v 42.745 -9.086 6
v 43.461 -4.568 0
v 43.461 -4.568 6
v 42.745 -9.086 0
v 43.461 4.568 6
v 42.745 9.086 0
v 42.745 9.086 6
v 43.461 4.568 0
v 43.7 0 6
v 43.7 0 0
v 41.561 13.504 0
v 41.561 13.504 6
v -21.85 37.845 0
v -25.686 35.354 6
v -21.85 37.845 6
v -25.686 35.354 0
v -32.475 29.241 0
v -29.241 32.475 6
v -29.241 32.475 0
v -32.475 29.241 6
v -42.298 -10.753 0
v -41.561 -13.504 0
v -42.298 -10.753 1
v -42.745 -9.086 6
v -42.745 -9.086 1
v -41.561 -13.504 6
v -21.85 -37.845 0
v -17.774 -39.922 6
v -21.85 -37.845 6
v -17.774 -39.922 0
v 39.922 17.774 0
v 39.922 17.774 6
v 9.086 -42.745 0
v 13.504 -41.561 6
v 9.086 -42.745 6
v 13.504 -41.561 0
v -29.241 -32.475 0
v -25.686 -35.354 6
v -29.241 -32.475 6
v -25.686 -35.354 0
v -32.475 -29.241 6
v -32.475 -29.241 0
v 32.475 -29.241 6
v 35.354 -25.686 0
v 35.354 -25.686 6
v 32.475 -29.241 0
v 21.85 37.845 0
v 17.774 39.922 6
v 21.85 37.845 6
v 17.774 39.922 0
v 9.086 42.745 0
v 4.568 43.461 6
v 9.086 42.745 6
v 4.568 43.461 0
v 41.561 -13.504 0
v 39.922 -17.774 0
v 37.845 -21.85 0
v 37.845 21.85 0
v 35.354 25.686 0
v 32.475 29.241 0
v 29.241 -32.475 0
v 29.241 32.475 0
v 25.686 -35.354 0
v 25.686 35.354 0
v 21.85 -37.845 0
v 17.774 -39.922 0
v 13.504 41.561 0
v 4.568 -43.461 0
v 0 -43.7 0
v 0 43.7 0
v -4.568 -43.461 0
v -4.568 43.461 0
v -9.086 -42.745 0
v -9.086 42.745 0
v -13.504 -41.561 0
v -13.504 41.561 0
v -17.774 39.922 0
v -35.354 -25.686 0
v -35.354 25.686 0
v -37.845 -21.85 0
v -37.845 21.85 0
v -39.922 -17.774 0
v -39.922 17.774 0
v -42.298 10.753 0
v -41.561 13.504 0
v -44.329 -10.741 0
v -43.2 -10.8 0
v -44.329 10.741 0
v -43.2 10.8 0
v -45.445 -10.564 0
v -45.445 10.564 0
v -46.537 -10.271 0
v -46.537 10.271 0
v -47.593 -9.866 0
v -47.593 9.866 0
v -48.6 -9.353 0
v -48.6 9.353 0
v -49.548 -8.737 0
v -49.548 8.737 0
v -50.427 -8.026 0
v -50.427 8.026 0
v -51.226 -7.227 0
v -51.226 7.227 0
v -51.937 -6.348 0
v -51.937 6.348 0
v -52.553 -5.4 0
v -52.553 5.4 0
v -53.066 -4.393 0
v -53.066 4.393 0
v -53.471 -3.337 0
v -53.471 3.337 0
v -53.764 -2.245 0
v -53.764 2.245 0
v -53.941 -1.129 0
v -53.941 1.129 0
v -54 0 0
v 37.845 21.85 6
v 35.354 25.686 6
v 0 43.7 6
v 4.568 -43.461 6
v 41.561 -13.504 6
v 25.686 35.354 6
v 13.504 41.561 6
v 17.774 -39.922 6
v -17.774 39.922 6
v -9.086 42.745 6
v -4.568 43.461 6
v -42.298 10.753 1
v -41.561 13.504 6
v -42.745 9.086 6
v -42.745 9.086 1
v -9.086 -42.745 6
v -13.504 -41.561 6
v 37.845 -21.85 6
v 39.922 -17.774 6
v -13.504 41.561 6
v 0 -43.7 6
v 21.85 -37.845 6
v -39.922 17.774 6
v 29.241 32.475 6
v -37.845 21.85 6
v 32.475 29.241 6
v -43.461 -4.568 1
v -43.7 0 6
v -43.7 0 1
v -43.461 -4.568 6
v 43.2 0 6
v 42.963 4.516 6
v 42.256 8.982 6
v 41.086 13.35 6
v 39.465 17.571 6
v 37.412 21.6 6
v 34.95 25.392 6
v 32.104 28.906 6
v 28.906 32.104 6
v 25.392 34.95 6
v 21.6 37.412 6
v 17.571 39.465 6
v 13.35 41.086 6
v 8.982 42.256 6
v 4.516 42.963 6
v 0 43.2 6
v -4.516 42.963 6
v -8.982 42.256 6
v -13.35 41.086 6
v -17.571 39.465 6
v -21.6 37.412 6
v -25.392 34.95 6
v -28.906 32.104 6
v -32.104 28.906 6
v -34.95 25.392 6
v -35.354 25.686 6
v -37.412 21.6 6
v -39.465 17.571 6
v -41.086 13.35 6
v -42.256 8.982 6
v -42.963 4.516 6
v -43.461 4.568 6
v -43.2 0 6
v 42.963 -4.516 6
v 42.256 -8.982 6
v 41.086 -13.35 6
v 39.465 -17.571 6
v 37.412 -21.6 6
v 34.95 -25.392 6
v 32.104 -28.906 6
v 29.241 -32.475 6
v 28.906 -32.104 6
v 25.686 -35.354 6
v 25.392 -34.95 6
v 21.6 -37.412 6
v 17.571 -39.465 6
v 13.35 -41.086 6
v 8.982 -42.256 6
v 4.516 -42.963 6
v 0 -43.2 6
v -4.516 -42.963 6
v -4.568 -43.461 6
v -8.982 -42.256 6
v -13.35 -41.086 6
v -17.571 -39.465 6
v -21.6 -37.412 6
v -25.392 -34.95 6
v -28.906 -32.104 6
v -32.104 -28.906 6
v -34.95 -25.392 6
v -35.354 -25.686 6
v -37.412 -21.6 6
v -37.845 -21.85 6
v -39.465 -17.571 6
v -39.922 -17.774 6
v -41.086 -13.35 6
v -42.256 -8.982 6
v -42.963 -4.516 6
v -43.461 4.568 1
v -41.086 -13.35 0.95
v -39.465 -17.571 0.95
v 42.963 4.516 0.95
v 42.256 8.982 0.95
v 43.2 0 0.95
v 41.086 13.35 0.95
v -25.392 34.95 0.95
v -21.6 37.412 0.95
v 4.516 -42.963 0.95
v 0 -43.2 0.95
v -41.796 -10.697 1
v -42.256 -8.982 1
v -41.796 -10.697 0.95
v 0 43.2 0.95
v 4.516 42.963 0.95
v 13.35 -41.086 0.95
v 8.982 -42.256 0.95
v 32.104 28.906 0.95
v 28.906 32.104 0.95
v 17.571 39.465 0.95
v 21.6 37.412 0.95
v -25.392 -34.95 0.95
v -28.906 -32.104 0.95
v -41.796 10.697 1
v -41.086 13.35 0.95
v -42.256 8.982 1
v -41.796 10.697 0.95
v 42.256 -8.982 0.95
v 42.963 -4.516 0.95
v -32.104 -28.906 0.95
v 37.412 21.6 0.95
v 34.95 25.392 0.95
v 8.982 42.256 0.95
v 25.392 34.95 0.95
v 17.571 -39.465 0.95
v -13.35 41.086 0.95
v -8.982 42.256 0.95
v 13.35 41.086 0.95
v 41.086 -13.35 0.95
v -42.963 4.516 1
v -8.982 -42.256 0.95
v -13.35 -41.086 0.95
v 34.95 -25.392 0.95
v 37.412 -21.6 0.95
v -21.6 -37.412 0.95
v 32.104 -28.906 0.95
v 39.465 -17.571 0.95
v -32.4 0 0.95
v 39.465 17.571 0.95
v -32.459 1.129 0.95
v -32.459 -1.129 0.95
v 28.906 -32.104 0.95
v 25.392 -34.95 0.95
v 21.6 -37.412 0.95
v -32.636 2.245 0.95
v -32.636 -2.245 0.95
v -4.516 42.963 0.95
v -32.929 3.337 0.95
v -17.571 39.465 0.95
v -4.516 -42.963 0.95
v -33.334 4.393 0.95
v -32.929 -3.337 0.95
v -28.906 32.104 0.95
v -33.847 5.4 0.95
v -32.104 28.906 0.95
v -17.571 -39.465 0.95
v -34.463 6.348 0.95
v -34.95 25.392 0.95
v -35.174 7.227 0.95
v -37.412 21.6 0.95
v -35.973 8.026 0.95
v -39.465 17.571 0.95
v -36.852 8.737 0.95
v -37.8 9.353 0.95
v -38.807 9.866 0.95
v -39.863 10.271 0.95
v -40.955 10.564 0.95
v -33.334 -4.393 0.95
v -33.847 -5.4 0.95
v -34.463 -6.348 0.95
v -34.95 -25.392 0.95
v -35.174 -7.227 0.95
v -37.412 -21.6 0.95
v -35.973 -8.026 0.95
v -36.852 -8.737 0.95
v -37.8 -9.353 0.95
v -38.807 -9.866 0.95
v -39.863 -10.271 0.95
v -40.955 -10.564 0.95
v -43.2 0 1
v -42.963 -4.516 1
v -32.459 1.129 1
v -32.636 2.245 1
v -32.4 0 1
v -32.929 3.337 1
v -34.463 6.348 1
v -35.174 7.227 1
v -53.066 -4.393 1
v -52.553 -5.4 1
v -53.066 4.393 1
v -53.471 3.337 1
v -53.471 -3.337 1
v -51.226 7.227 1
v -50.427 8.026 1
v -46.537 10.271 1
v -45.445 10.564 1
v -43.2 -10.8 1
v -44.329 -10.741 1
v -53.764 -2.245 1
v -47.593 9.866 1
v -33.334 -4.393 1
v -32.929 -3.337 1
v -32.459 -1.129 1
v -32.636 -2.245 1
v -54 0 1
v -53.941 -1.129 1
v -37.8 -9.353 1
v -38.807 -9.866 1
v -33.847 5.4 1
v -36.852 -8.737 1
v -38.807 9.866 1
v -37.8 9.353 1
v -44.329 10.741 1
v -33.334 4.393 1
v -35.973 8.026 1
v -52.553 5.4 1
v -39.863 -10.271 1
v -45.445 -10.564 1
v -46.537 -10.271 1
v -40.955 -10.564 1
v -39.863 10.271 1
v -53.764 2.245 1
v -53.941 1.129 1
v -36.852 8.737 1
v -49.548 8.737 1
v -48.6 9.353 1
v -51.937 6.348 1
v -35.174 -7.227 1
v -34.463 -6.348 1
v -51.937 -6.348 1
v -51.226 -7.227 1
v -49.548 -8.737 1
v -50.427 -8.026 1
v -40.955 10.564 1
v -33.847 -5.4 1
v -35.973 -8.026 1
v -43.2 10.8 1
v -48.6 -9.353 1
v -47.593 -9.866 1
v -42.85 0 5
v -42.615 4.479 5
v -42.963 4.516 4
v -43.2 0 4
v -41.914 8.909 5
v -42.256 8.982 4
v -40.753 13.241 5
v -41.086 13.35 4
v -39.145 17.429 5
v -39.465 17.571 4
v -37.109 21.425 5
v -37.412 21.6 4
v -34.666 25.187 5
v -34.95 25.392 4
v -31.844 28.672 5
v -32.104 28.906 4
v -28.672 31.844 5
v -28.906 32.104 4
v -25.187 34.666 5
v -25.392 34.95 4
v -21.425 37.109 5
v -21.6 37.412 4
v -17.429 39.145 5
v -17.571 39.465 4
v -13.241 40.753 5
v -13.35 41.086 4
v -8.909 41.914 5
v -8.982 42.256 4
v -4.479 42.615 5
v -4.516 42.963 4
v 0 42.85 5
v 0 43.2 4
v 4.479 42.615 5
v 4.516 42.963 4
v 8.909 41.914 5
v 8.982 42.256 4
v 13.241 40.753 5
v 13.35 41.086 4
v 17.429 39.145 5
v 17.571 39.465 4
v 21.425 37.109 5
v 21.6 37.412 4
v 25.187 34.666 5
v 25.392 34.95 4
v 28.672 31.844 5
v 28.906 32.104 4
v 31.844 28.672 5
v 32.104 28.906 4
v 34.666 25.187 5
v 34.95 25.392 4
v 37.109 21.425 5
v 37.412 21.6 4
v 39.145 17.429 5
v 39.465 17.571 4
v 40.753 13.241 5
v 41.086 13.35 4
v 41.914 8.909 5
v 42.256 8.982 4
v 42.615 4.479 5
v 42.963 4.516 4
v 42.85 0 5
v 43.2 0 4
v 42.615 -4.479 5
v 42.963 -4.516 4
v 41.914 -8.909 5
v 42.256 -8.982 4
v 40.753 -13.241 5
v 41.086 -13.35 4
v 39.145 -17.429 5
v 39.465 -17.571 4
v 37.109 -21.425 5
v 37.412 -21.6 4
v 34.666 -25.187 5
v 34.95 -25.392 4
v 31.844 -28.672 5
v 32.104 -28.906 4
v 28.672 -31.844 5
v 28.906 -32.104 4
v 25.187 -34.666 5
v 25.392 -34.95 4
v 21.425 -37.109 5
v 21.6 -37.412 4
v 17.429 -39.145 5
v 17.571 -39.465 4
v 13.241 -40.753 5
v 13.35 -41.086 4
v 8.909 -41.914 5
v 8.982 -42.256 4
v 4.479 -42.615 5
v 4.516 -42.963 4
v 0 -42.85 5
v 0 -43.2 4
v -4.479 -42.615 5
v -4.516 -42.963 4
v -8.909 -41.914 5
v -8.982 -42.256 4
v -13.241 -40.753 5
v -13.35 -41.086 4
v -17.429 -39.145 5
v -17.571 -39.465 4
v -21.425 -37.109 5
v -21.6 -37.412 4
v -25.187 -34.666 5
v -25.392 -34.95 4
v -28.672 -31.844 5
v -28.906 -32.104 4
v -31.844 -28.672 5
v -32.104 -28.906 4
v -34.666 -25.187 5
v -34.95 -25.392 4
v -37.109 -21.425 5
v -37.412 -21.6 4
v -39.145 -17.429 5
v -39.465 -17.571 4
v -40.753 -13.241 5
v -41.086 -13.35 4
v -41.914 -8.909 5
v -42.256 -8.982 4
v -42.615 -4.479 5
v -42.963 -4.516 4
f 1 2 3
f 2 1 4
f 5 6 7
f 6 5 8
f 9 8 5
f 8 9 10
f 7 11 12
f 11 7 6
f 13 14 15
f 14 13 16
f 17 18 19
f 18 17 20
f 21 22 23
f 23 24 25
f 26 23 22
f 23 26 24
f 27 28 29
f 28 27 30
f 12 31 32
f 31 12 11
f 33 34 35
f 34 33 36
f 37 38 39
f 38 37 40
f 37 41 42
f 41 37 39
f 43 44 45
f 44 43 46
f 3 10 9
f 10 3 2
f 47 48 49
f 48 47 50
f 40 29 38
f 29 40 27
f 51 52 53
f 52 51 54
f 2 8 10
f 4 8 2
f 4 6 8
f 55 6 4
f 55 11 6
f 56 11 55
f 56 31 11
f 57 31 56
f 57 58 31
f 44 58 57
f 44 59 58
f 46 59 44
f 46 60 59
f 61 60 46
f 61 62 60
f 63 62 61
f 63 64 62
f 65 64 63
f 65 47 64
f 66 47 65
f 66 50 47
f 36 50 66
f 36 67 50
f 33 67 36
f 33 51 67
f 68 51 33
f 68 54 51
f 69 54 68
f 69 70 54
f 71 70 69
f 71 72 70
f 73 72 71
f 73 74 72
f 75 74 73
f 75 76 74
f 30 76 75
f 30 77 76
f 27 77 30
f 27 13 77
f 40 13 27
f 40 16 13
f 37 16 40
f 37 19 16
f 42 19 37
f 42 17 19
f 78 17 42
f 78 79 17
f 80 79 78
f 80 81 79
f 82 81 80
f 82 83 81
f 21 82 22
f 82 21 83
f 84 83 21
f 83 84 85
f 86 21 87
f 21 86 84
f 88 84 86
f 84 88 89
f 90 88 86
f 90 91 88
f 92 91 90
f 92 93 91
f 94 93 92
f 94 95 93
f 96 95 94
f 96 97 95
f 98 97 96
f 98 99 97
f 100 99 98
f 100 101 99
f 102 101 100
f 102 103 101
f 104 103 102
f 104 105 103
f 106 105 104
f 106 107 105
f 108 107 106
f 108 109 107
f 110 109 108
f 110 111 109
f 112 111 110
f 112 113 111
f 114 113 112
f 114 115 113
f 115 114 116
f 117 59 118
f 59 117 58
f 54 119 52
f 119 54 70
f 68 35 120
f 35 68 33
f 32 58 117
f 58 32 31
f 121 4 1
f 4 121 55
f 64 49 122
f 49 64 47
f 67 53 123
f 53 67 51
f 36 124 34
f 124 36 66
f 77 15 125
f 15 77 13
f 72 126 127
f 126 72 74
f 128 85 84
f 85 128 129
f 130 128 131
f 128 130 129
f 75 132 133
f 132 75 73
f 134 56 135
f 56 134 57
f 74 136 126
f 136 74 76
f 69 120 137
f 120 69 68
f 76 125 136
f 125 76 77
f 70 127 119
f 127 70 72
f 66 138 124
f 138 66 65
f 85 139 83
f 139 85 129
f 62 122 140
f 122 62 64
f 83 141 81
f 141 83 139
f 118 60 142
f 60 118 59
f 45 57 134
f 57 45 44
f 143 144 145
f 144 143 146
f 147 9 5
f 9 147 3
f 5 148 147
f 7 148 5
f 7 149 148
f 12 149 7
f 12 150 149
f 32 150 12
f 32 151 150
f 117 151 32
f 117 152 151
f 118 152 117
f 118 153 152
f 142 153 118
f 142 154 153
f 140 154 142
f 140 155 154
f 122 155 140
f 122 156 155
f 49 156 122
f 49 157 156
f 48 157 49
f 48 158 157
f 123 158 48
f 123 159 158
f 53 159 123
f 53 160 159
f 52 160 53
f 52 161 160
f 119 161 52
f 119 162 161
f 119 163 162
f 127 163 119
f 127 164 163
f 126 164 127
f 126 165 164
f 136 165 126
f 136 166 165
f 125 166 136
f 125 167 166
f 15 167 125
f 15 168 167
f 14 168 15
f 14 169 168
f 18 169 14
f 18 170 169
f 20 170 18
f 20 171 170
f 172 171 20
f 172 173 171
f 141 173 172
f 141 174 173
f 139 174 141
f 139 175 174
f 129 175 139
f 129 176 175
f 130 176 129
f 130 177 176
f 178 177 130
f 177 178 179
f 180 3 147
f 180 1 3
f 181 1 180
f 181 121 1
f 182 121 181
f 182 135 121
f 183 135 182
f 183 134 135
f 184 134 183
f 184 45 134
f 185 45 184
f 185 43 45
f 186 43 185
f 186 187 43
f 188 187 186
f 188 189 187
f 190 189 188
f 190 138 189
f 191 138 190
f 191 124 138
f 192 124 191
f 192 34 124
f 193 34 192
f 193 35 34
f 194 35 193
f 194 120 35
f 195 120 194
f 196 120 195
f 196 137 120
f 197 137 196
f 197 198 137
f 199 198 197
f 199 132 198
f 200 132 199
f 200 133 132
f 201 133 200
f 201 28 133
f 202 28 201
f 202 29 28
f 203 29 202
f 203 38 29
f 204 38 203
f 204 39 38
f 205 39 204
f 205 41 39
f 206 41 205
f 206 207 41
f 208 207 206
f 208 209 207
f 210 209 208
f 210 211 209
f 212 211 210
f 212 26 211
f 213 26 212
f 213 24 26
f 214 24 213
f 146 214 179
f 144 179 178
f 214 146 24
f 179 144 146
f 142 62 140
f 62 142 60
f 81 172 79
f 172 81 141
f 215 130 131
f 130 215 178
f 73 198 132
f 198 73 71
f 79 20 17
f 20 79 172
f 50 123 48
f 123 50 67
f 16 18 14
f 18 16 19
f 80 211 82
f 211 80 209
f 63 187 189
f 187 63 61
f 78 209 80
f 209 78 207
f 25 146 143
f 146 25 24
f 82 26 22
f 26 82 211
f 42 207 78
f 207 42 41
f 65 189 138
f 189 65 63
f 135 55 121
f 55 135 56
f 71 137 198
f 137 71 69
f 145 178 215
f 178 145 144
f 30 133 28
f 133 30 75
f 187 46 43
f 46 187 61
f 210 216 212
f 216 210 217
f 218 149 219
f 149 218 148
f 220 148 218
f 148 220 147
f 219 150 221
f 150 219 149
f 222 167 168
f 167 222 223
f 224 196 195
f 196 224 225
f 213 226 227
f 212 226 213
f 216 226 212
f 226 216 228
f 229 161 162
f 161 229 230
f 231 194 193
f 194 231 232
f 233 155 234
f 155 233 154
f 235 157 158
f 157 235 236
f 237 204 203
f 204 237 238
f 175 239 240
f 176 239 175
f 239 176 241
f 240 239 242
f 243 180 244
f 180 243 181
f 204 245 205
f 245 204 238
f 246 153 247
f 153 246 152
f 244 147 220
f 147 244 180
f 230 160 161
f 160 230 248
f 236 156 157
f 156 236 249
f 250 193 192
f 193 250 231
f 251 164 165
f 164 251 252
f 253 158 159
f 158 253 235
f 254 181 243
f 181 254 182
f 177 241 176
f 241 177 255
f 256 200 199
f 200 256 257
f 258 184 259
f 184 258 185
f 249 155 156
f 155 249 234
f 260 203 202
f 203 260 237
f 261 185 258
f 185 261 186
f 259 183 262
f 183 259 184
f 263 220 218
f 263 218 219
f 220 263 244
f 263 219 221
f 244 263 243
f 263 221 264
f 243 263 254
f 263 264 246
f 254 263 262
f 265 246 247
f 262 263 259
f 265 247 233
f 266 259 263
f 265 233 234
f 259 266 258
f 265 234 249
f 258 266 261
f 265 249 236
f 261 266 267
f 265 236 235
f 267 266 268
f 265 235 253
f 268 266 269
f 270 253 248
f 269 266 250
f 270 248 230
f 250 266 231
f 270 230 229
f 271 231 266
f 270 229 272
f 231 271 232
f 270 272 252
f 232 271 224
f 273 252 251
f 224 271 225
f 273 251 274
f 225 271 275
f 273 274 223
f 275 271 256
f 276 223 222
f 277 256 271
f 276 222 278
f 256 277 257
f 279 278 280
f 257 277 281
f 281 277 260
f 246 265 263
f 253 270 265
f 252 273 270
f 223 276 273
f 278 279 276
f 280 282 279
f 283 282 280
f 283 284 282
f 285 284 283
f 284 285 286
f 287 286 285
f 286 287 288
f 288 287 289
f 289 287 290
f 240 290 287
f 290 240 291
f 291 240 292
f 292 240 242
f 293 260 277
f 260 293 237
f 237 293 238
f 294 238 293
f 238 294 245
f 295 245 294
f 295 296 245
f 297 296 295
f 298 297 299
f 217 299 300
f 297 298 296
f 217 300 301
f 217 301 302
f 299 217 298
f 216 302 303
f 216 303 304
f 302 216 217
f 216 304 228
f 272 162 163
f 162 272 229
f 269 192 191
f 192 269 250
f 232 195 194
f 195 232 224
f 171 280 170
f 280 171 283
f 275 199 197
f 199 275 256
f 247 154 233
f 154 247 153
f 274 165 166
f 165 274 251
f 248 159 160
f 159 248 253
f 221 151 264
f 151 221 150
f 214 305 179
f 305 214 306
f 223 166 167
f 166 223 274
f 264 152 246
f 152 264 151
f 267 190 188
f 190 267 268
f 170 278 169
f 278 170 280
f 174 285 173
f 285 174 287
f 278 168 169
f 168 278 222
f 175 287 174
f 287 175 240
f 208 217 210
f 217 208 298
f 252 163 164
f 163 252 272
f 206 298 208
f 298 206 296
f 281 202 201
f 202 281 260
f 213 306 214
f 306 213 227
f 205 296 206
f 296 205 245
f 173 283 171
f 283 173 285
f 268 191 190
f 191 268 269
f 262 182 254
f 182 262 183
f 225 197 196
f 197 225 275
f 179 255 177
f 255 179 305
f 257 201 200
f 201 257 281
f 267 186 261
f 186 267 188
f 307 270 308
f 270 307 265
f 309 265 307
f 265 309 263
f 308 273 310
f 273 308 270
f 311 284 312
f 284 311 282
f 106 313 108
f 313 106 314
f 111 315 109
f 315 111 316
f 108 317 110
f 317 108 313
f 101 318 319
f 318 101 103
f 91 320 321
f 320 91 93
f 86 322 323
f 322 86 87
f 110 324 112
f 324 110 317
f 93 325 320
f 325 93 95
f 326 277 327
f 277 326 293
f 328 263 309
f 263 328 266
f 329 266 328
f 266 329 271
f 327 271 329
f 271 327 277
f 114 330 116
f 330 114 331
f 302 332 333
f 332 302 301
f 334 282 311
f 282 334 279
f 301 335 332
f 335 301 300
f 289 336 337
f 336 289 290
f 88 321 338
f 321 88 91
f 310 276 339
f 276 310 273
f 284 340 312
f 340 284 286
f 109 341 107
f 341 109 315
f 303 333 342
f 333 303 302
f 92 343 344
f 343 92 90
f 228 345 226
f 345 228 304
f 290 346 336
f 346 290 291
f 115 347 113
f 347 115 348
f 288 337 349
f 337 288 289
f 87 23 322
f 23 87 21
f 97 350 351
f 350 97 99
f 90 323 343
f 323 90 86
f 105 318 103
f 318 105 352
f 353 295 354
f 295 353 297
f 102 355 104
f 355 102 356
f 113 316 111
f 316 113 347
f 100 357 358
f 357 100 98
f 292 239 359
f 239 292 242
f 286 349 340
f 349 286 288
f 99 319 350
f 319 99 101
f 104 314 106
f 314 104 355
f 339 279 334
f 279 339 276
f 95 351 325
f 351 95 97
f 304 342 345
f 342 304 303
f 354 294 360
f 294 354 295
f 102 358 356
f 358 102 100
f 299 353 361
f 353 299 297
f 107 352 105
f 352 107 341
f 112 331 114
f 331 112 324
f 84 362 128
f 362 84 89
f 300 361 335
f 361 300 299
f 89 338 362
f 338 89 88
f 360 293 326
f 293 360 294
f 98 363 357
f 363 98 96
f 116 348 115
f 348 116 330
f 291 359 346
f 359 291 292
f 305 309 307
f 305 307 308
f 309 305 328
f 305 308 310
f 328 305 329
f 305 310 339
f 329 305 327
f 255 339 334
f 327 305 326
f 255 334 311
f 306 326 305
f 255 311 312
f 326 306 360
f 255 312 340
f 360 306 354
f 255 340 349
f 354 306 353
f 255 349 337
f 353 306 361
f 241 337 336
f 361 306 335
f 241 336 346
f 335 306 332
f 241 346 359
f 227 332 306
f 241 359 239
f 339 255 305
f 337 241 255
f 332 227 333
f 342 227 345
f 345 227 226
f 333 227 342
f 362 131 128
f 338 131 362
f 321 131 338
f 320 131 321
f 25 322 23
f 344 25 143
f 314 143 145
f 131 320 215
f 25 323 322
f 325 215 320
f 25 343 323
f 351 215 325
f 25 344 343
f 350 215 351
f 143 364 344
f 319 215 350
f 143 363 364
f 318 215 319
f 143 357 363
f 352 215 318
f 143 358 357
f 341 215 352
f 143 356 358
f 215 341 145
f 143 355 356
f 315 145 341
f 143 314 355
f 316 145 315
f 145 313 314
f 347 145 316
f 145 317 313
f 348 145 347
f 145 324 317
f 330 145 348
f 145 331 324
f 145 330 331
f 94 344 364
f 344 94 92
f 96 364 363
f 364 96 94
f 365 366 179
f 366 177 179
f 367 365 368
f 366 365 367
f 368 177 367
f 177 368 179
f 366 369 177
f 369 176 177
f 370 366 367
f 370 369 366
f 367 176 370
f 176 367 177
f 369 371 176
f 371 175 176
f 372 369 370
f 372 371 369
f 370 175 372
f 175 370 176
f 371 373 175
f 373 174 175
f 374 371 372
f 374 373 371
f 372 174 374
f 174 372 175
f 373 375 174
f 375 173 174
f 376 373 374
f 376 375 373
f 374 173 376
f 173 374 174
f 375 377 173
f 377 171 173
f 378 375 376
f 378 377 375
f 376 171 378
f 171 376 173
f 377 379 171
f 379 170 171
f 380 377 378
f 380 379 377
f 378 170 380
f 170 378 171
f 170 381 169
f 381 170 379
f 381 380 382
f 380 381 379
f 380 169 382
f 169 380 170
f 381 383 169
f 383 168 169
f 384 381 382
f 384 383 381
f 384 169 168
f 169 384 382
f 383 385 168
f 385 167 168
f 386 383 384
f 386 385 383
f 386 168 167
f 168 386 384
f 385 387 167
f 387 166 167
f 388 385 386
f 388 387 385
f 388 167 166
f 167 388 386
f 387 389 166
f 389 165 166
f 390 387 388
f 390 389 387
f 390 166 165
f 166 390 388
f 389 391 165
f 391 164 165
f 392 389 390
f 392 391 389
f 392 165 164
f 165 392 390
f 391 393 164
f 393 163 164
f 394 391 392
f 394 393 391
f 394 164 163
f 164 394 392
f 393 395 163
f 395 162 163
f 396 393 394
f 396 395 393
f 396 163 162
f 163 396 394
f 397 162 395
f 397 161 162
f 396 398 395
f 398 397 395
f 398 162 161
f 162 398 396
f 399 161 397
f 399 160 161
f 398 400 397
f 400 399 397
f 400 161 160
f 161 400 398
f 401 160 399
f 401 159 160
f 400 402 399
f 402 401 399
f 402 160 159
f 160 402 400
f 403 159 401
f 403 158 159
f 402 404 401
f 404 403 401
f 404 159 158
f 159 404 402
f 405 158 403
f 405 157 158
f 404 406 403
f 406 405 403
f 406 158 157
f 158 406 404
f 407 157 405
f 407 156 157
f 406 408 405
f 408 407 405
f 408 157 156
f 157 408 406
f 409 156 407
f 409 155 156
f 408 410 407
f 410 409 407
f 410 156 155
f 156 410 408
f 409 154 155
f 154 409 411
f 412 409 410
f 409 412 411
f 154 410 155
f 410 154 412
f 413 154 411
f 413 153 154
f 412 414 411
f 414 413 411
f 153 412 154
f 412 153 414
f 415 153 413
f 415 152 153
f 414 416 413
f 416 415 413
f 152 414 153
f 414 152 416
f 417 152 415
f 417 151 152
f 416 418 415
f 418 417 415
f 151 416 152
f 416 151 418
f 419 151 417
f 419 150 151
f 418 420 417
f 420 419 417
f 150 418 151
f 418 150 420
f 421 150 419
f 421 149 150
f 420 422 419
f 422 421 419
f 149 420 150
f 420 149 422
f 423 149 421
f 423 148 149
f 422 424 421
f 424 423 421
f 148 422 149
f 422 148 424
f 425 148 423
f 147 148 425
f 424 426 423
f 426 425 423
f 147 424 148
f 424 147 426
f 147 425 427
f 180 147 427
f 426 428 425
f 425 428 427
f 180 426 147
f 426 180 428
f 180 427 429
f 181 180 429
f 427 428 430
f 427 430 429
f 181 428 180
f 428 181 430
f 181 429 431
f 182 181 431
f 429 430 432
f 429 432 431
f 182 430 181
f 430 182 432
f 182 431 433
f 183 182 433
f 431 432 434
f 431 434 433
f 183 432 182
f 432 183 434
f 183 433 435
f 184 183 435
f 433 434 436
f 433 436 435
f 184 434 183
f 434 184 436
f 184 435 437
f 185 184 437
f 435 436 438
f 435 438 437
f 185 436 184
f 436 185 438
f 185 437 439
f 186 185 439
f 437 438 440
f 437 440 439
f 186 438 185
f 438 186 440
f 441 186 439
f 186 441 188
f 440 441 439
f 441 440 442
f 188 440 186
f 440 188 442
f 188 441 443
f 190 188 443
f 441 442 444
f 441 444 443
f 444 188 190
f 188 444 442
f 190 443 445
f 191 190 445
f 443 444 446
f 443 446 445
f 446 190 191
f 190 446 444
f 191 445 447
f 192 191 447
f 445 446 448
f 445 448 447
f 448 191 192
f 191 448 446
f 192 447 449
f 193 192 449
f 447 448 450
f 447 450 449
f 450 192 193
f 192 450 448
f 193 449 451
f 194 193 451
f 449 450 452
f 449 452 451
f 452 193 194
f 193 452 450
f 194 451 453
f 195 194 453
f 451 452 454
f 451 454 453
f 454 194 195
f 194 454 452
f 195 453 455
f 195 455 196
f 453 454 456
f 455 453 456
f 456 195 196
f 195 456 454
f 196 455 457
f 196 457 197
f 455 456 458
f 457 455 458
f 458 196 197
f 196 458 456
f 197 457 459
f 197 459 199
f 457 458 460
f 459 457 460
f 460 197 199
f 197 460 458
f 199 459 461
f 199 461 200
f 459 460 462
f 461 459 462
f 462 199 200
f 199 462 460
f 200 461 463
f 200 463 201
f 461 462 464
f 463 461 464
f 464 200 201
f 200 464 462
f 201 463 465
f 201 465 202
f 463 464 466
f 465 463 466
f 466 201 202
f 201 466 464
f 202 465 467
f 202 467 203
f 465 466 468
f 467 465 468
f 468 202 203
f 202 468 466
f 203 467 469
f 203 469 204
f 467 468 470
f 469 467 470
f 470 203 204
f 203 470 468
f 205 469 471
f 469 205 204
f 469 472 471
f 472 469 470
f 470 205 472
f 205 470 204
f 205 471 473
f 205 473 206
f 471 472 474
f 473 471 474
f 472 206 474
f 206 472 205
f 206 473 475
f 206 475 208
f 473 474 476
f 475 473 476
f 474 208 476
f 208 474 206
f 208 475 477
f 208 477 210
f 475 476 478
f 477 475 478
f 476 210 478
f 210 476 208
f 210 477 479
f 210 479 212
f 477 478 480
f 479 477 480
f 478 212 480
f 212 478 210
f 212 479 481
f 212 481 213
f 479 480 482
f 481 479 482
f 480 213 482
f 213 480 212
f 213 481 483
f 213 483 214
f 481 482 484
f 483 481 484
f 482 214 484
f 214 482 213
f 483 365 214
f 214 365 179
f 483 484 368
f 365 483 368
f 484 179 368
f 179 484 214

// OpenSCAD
canDiameter = 86.4;
lidWallThickness = 1;
lipThickness = 0.35;
lipHeight=2;
handleRatio = 0.25;
lidHeight = 5;
lipZAdjustment = 0;
$fn=60;

union() {
    translate([0,0,(lidWallThickness+lidHeight)/2])
    difference() {
        cylinder (h = lidWallThickness+lidHeight, d = canDiameter+lidWallThickness, center=true);
        translate([0,0,lidWallThickness/2])
        cylinder (h = lidHeight+0.1, d = canDiameter, center=true);
    }

    translate ([-canDiameter/2,0,lidWallThickness/2])
        cylinder (h = lidWallThickness, d = canDiameter*handleRatio, center=true);
    
    translate([0,0,lidWallThickness+lidHeight-2+lipZAdjustment])
    rotate_extrude(angle = 360, convexity = 2)
    polygon( points=[[canDiameter/2,2],[canDiameter/2-lipThickness,2-lipHeight/2],[canDiameter/2,2-lipHeight]] );
}
